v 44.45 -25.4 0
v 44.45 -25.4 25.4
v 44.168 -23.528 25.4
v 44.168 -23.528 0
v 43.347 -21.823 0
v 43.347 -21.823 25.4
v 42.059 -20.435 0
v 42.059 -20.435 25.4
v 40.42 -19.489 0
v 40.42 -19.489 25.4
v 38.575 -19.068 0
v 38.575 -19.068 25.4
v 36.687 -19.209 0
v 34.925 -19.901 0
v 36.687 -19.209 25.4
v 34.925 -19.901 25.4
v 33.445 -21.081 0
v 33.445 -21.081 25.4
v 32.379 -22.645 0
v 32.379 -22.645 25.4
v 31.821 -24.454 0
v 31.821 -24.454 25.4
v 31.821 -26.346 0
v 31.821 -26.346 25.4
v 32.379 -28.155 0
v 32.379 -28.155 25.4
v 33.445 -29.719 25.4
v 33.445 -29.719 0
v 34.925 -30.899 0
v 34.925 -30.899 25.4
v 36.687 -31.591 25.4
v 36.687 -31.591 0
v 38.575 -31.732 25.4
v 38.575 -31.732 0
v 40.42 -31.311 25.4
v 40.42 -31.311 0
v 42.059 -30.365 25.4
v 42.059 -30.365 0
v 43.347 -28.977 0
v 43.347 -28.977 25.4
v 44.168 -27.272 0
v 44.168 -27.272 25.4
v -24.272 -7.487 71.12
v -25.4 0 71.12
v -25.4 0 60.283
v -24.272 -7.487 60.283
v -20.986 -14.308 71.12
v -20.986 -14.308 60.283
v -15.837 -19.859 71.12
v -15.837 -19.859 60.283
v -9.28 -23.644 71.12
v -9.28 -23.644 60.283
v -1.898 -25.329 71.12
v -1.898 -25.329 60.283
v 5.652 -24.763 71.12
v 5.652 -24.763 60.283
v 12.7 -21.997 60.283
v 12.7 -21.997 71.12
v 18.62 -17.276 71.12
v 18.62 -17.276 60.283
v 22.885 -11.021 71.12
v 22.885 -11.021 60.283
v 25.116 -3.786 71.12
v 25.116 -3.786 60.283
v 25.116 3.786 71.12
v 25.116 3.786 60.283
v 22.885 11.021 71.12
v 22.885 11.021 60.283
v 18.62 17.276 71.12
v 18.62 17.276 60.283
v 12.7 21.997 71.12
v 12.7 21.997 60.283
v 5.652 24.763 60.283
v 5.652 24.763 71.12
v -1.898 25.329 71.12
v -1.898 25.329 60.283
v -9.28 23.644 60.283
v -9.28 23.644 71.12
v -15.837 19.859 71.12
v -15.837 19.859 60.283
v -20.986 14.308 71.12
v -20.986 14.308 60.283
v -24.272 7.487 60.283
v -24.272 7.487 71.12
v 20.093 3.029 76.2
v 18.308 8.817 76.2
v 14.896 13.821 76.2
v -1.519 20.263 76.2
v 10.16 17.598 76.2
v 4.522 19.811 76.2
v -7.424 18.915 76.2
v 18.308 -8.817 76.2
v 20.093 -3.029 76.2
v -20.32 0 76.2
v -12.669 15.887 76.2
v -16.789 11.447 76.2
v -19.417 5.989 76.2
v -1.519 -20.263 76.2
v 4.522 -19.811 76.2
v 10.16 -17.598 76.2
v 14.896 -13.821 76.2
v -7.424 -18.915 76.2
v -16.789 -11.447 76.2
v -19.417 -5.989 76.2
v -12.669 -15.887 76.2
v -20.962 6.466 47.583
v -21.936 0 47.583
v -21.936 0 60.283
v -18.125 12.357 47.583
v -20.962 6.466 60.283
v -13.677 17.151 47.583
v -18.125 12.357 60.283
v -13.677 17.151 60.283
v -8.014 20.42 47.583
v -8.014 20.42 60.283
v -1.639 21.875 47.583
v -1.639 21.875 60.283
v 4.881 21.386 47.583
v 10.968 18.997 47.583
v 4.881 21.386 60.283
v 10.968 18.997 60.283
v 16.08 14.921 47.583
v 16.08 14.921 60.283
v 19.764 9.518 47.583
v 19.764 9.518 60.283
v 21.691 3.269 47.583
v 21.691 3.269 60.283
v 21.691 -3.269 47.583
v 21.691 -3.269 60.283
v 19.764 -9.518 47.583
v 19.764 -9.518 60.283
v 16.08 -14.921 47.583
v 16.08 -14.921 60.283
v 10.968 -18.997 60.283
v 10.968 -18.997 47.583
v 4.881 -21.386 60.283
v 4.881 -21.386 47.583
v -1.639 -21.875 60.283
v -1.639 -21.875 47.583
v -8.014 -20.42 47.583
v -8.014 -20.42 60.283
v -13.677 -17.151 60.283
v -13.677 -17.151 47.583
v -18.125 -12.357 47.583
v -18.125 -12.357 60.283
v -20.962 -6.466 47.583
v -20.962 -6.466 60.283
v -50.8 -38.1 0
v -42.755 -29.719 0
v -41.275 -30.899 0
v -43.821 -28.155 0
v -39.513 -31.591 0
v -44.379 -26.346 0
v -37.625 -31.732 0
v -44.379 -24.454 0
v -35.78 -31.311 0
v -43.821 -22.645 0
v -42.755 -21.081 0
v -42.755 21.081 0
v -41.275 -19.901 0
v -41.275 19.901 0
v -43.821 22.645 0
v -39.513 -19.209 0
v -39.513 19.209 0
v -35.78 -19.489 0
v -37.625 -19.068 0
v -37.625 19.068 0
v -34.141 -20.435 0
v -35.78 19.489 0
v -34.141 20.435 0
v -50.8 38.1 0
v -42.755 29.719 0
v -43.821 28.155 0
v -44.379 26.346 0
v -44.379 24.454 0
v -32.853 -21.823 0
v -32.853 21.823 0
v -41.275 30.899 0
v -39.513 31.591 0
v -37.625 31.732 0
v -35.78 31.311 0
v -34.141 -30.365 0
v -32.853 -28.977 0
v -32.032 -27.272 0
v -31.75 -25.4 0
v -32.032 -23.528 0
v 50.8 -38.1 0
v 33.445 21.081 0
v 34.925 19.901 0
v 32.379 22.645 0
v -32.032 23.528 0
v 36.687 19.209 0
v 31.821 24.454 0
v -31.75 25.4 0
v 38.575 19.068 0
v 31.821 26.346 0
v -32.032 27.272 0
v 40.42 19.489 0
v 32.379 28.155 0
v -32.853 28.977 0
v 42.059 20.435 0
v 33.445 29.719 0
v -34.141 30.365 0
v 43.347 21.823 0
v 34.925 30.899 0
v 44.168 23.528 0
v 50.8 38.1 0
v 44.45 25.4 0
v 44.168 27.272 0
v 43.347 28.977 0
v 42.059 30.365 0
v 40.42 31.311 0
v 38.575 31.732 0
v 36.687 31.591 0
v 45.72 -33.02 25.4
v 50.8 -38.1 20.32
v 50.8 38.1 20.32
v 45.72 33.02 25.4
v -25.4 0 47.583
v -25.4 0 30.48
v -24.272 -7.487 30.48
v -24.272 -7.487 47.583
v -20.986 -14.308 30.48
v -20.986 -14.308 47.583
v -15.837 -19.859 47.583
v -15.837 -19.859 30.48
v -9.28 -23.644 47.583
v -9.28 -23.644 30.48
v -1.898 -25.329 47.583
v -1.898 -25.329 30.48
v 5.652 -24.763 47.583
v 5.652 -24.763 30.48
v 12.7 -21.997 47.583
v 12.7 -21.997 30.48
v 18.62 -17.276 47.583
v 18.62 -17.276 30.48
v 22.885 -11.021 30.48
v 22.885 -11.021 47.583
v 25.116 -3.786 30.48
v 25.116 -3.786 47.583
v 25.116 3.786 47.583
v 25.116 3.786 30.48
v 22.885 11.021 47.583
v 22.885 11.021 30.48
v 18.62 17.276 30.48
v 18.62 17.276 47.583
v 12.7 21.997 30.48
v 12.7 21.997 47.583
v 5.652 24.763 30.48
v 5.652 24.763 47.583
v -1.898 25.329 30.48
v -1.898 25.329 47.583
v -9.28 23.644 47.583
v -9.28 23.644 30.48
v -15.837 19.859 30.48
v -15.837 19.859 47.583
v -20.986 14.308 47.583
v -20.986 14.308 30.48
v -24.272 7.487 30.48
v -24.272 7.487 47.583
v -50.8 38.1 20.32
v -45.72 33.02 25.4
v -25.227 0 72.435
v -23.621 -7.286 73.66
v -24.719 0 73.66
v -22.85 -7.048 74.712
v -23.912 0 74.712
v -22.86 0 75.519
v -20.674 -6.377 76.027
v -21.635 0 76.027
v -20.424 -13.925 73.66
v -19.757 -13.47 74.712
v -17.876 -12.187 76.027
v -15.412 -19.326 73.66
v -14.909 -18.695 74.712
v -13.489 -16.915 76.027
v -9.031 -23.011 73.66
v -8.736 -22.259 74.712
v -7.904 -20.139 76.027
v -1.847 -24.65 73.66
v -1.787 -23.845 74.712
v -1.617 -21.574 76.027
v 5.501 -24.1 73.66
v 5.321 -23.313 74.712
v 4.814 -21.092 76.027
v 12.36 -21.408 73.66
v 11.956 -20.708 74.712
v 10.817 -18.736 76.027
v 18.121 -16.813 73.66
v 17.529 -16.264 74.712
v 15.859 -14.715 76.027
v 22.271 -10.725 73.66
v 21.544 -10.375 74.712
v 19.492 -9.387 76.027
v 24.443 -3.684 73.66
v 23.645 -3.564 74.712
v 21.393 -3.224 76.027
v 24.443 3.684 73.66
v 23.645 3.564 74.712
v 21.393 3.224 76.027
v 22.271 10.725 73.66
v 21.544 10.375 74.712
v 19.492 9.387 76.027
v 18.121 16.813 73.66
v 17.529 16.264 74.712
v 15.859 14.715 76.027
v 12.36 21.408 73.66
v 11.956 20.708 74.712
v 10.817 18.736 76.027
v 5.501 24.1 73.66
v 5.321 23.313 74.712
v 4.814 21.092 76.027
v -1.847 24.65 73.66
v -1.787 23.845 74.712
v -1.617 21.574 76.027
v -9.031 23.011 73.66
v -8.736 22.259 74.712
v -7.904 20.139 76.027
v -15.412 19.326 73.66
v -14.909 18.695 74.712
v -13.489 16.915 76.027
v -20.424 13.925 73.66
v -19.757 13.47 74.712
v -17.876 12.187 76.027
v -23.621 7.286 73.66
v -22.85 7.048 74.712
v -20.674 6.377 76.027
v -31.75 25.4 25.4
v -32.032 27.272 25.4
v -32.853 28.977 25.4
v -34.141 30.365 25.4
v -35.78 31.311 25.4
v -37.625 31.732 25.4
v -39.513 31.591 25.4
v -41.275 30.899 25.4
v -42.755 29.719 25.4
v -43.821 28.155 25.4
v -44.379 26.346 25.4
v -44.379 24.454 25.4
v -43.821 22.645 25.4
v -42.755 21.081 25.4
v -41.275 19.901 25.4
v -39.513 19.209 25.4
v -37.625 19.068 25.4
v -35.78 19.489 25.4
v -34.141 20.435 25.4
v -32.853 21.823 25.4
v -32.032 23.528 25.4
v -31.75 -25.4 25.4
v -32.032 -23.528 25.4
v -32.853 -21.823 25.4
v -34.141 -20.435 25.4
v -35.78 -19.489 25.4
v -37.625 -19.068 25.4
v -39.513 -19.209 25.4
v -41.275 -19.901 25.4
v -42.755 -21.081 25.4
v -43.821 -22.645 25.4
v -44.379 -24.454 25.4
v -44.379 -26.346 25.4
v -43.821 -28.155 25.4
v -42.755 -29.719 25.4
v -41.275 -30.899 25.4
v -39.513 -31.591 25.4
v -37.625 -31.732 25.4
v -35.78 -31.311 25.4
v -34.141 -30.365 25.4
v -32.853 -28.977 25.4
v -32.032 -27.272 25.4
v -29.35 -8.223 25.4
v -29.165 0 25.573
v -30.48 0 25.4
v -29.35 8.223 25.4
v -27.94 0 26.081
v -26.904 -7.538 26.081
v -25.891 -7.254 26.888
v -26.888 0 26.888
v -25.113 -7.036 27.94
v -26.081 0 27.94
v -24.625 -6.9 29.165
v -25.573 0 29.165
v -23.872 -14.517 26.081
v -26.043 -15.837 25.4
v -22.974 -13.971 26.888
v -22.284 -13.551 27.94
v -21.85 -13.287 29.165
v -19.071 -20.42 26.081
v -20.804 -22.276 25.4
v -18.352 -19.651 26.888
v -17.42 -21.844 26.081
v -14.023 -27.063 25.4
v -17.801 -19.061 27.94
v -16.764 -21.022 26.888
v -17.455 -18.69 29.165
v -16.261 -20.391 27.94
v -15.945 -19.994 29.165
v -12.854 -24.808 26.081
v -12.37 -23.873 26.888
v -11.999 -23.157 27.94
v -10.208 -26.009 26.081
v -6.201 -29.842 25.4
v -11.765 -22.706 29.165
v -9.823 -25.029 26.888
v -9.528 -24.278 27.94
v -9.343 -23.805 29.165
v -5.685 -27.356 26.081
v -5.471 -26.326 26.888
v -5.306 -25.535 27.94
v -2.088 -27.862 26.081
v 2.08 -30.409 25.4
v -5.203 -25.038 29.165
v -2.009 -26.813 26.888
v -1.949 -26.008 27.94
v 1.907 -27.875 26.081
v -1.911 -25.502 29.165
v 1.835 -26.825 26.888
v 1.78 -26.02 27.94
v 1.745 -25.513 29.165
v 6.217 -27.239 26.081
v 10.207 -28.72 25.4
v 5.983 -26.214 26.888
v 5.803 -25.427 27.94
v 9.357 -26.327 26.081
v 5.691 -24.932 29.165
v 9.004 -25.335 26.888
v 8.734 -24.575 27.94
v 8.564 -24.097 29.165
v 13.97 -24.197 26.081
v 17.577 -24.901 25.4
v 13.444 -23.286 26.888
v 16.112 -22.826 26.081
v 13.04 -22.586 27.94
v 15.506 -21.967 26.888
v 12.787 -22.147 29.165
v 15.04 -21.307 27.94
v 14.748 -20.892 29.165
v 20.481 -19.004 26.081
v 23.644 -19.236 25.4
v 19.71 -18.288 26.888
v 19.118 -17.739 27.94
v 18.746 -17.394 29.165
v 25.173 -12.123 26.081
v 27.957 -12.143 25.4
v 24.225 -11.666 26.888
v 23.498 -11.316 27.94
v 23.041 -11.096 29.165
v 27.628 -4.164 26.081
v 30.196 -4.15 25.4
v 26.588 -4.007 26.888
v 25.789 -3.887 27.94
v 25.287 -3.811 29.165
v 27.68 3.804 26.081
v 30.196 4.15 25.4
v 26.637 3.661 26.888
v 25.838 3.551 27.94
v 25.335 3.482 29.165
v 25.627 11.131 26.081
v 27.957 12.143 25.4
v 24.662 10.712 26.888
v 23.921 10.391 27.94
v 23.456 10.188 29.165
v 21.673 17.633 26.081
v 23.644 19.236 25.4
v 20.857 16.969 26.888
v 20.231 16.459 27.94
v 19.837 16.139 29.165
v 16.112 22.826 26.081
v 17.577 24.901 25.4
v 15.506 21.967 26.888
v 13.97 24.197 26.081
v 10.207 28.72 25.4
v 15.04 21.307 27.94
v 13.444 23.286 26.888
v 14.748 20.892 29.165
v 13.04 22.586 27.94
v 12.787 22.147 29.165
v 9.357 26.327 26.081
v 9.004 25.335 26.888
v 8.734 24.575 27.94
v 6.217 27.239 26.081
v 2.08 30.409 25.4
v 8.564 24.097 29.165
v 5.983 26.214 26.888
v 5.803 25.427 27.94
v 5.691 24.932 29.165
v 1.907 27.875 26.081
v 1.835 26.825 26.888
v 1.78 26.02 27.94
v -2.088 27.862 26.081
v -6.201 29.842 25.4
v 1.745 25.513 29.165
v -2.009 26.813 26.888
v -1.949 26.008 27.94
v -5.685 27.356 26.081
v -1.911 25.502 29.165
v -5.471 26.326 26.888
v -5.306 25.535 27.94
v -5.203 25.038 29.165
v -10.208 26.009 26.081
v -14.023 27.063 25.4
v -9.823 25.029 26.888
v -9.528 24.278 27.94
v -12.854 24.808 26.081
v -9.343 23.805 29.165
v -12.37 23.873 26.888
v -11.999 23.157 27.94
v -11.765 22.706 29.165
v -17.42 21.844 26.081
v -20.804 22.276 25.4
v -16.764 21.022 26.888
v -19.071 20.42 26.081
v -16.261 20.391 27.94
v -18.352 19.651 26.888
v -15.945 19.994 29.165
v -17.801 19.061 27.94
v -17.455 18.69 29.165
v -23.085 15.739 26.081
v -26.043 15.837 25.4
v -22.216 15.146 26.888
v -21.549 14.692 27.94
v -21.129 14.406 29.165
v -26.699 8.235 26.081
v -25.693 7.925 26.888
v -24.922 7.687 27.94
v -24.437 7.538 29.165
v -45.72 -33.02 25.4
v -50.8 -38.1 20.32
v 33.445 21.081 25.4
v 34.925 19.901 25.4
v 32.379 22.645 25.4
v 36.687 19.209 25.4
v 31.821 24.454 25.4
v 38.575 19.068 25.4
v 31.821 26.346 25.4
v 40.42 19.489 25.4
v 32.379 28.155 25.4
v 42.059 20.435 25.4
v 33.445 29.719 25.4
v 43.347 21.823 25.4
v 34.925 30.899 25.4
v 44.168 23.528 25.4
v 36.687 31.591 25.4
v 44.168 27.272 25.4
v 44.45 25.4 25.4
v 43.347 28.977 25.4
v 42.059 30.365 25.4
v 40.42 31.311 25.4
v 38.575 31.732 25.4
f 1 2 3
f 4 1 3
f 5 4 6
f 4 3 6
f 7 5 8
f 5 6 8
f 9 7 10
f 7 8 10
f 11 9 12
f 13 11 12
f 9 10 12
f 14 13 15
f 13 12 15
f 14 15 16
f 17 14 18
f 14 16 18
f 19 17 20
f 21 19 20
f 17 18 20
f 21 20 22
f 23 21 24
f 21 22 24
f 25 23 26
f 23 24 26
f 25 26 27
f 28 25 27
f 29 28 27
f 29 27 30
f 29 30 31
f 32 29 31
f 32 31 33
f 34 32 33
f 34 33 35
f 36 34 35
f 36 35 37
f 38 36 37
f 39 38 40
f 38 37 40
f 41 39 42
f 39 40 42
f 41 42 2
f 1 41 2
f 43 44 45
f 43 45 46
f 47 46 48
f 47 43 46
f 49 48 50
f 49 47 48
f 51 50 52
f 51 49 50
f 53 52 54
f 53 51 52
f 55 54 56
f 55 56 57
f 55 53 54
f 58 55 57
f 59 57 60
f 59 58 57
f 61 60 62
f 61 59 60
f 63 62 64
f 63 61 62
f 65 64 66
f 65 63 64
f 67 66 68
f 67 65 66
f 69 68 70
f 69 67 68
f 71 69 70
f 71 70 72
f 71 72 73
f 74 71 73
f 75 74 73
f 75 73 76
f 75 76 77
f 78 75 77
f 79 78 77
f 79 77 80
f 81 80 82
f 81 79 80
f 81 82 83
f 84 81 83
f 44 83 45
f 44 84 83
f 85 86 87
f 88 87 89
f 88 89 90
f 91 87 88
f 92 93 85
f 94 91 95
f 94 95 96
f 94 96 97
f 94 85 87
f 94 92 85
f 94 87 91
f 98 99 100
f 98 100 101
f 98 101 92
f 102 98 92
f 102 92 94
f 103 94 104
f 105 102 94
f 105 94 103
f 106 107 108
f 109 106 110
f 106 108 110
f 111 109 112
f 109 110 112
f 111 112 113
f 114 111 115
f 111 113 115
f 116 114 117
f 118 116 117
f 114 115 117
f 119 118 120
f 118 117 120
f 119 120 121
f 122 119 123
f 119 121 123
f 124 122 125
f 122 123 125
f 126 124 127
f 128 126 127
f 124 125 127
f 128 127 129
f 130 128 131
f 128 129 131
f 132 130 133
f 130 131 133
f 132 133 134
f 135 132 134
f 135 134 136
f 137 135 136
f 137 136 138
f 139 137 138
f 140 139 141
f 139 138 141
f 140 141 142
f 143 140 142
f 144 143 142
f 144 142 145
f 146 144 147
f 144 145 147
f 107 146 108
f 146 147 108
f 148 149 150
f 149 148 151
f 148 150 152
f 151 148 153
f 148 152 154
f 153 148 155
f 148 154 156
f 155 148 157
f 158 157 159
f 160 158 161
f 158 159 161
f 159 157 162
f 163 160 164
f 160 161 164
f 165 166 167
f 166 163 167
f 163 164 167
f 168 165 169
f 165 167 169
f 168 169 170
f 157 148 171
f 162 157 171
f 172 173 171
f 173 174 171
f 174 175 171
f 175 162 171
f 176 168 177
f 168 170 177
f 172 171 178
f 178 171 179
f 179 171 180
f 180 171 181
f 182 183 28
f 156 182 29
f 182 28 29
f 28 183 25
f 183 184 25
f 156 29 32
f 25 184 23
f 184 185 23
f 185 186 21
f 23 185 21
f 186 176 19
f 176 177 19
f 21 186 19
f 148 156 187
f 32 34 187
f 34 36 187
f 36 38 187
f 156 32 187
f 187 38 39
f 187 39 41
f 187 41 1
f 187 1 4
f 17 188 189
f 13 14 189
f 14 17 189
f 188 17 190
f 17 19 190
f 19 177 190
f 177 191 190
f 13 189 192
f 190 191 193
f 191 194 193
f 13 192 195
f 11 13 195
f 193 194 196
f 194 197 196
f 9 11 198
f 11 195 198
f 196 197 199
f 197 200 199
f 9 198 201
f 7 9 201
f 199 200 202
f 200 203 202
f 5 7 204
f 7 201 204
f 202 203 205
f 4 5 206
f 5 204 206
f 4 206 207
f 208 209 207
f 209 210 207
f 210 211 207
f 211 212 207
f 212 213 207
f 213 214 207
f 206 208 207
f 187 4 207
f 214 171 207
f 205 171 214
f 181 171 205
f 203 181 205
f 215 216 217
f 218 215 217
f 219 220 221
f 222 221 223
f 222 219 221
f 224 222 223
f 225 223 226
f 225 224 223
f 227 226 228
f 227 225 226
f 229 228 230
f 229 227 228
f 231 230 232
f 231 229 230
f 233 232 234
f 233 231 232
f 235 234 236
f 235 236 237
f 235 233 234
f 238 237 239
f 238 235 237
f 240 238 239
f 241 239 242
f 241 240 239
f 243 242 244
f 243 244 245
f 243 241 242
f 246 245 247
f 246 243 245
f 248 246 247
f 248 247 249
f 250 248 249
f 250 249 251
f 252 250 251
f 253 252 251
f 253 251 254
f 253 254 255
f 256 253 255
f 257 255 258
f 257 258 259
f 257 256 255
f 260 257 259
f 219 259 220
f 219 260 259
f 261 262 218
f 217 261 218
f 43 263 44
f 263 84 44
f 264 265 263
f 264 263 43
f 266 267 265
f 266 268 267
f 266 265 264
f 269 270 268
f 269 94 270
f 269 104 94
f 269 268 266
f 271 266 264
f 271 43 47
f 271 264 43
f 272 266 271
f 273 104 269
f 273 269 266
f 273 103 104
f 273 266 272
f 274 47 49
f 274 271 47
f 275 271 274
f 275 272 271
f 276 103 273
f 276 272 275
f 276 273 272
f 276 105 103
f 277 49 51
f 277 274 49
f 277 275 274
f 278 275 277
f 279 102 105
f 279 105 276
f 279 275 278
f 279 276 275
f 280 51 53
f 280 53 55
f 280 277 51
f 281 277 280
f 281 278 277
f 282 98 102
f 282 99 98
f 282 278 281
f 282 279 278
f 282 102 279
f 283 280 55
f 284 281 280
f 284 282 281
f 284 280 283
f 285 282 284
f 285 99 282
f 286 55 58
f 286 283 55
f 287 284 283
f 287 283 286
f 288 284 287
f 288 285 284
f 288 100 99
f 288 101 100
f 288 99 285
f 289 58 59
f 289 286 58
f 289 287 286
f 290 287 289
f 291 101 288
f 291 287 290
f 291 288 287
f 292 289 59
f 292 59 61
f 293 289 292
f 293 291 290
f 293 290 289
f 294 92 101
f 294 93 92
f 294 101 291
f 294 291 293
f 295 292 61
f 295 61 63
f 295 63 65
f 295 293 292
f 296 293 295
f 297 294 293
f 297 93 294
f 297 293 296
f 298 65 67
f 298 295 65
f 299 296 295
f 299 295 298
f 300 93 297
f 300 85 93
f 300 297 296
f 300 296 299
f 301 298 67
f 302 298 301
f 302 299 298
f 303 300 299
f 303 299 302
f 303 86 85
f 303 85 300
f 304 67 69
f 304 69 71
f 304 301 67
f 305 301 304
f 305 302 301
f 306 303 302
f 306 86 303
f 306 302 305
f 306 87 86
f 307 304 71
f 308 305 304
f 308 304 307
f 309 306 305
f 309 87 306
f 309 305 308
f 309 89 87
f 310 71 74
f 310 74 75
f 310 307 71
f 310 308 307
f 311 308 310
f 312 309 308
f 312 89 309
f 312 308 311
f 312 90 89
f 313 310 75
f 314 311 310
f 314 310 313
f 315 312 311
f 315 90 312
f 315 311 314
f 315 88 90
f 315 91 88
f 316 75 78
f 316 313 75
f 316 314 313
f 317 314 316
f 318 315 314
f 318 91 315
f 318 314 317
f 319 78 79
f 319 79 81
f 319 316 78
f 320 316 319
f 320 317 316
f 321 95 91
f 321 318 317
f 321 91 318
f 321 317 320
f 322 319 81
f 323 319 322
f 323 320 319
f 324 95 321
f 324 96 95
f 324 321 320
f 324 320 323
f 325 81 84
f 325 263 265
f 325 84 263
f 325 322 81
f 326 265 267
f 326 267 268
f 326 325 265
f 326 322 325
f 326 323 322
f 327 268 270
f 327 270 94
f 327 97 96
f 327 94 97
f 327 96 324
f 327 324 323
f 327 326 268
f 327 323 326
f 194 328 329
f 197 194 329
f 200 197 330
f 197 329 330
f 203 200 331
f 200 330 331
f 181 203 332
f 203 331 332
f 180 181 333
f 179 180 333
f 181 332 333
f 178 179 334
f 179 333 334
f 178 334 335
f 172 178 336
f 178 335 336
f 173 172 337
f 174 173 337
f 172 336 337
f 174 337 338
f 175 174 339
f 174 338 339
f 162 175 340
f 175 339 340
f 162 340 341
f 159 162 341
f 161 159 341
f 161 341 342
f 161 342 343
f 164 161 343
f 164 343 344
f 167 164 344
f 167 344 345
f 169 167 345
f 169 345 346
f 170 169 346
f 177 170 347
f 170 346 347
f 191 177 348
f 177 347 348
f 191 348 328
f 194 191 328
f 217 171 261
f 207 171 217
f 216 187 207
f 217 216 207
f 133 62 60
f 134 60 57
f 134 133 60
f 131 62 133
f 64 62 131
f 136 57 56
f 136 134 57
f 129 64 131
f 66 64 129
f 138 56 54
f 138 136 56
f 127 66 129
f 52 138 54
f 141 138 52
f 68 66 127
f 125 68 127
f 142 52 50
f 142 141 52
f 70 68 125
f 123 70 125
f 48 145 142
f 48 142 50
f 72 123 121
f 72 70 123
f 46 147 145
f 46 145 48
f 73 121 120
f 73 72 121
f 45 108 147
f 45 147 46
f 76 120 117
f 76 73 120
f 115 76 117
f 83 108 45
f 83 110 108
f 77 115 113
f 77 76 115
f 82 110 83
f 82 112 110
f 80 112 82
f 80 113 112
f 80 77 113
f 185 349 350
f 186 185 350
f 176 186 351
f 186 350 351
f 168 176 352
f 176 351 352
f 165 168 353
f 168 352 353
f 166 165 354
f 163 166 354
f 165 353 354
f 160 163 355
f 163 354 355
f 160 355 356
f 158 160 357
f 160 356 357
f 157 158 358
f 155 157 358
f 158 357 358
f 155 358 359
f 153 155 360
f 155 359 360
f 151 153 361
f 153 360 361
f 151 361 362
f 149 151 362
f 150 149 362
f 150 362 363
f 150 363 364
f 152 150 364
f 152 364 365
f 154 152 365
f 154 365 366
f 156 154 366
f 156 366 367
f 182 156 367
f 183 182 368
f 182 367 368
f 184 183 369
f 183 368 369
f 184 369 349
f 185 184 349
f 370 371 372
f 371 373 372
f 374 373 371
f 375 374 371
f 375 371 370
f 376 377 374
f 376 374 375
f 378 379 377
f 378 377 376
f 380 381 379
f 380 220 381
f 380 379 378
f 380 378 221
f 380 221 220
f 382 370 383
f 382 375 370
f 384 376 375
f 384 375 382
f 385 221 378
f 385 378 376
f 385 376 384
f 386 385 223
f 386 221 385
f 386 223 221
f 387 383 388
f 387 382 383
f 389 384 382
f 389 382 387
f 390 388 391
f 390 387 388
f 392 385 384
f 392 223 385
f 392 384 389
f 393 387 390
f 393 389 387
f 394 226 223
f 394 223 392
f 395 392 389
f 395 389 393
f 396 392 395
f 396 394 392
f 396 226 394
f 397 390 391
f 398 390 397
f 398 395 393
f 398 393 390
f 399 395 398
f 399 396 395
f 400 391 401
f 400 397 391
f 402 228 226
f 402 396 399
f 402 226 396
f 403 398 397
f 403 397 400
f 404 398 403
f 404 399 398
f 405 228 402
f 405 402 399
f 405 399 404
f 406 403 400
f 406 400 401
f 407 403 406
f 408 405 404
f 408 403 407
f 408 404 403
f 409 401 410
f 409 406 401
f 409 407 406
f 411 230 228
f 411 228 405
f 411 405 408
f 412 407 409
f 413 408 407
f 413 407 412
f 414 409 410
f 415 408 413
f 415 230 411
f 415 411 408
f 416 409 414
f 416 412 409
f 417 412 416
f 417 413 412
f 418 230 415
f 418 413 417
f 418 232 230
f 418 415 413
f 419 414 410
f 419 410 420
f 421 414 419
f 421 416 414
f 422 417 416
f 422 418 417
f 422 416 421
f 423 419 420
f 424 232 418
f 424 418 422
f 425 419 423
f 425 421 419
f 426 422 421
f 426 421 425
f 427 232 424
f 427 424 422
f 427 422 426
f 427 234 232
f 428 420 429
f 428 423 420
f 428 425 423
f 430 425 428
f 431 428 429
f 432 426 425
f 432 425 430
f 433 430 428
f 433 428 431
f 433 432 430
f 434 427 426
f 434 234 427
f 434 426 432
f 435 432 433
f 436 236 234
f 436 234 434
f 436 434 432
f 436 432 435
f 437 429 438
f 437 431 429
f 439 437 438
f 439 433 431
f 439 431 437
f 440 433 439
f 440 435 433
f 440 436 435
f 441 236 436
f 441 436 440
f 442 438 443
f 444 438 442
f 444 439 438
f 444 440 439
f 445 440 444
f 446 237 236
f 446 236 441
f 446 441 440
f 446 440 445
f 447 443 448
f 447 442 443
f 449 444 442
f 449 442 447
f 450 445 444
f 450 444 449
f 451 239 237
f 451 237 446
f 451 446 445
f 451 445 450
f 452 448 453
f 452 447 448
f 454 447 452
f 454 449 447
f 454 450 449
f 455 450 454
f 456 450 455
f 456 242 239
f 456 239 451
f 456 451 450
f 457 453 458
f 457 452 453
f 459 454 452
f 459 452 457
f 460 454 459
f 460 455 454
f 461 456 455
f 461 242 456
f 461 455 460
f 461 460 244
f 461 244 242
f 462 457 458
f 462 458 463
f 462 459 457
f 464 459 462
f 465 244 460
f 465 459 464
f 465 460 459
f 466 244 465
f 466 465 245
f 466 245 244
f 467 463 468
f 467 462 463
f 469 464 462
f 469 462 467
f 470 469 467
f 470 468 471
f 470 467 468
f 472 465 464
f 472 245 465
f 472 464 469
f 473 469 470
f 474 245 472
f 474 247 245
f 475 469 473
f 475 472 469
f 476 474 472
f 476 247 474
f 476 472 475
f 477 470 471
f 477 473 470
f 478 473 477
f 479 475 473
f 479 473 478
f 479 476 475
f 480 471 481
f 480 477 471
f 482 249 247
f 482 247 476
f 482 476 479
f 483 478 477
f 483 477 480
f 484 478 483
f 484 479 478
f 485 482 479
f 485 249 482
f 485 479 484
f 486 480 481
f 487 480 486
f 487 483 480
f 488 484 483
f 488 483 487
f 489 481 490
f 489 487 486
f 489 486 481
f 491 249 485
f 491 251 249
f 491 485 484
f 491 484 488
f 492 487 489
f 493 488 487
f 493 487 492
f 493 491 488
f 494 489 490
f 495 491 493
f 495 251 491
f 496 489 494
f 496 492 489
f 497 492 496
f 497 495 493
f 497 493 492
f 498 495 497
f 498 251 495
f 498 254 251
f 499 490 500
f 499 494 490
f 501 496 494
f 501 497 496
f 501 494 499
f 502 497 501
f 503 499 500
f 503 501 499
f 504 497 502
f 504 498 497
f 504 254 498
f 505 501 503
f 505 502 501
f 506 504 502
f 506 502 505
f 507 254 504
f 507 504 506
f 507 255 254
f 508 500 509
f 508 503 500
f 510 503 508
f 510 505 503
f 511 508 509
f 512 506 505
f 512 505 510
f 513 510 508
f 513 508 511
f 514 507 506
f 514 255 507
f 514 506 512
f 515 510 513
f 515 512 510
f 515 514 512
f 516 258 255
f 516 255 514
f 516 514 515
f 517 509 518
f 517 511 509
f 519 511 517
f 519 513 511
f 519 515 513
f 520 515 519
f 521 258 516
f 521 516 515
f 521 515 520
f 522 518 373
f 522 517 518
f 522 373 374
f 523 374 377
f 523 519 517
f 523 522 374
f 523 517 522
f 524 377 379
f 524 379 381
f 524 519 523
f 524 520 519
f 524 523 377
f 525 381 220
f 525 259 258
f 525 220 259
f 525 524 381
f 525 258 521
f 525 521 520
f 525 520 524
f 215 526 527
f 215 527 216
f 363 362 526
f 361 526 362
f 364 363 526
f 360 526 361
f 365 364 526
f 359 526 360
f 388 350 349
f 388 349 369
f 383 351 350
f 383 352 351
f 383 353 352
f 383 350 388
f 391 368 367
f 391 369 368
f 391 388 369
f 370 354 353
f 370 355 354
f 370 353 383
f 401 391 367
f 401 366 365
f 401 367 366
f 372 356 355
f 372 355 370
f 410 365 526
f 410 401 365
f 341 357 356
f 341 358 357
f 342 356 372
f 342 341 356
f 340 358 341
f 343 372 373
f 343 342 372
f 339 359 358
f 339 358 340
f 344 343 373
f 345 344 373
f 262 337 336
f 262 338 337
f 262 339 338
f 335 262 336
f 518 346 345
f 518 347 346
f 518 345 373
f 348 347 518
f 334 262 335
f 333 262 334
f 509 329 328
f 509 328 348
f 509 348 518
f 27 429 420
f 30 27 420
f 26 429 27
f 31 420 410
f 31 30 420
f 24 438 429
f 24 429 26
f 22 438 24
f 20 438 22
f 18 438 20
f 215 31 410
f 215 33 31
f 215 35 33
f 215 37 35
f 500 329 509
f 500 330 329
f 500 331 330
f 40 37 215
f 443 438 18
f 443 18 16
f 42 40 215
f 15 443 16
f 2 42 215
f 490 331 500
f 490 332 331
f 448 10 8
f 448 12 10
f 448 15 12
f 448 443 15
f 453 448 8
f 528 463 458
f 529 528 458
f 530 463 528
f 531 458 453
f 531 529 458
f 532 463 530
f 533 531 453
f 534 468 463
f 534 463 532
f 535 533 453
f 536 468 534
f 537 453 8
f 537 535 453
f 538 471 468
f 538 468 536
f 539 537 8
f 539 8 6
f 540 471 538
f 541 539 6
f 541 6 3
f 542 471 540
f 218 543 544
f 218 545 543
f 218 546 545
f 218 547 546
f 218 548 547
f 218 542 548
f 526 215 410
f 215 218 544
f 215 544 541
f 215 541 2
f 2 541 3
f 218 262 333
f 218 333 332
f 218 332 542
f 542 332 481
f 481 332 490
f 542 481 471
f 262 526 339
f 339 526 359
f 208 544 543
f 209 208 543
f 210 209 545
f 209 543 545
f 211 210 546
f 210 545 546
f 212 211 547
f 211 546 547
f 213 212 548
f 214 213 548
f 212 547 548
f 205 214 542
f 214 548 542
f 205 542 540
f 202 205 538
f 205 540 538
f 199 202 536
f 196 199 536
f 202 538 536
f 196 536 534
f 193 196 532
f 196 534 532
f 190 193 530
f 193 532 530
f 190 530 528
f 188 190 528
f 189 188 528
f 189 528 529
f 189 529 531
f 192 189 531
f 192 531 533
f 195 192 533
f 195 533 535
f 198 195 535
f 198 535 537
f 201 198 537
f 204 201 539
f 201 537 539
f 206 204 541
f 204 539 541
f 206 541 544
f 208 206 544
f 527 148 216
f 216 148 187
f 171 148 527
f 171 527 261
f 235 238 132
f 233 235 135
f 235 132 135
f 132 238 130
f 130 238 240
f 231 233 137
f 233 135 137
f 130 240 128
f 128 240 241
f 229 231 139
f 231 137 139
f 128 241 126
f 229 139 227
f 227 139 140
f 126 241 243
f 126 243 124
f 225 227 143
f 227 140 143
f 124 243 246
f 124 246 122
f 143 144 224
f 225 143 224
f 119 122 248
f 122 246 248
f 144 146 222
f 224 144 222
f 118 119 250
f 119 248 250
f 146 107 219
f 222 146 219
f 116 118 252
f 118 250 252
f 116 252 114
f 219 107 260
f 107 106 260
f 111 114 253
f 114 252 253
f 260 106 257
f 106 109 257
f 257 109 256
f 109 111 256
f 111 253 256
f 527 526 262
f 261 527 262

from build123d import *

# Parameters (mm, degrees)
F0_W     = 101.6
F0_H     = 76.2
F1_DEPTH = 25.4
F2_R     = 6.35
F3_DEPTH = 25.4
F4_W     = 25.4
F4_H     = 50.8
F6_W     = 16.163637
F6_H     = 12.7
F8_SIZE  = 5.08
F9_R     = 5.08


with BuildPart() as f1:
    # F0 (on Top) → F1 (new body)
    with BuildSketch(Plane.XY):
        Rectangle(F0_W, F0_H)
    extrude(amount=F1_DEPTH)

    # F2 (on face) → F3 (cut)
    with BuildSketch(Plane.XY.offset(25.4)):
        with Locations((-38.1, 25.4)):
            Circle(F2_R)
        with Locations((38.1, 25.4)):
            Circle(F2_R)
        with Locations((38.1, -25.4)):
            Circle(F2_R)
        with Locations((-38.1, -25.4)):
            Circle(F2_R)
    extrude(amount=-F3_DEPTH, mode=Mode.SUBTRACT)

    # F4 (on Front) → F5 (revolve)
    with BuildSketch(Plane.XZ):
        with Locations((-12.7, 50.8)):
            Rectangle(F4_W, F4_H)
    revolve(axis=Axis((0, 0, 50.8), (0, 0, 1)))

    # F6 (on Front) → F7 (revolve, cut)
    with BuildSketch(Plane.XZ):
        with Locations((-30.018182, 53.93349)):
            Rectangle(F6_W, F6_H)
    revolve(axis=Axis((0, 0, 76.2), (0, 0, -1)), mode=Mode.SUBTRACT)

    # F8
    f8_edges = [f1.edges().sort_by_distance(p)[0] for p in [
        (0, -38.1, 25.4),
        (-50.8, 0, 25.4),
        (0, 38.1, 25.4),
        (50.8, 0, 25.4),
    ]]
    chamfer(f8_edges, length=F8_SIZE)

    # F9
    f9_edges = [f1.edges().sort_by_distance(p)[0] for p in [
        (25.4, 0, 25.4),
        (25.4, 0, 76.2),
    ]]
    fillet(f9_edges, radius=F9_R)


solid = f1.part
